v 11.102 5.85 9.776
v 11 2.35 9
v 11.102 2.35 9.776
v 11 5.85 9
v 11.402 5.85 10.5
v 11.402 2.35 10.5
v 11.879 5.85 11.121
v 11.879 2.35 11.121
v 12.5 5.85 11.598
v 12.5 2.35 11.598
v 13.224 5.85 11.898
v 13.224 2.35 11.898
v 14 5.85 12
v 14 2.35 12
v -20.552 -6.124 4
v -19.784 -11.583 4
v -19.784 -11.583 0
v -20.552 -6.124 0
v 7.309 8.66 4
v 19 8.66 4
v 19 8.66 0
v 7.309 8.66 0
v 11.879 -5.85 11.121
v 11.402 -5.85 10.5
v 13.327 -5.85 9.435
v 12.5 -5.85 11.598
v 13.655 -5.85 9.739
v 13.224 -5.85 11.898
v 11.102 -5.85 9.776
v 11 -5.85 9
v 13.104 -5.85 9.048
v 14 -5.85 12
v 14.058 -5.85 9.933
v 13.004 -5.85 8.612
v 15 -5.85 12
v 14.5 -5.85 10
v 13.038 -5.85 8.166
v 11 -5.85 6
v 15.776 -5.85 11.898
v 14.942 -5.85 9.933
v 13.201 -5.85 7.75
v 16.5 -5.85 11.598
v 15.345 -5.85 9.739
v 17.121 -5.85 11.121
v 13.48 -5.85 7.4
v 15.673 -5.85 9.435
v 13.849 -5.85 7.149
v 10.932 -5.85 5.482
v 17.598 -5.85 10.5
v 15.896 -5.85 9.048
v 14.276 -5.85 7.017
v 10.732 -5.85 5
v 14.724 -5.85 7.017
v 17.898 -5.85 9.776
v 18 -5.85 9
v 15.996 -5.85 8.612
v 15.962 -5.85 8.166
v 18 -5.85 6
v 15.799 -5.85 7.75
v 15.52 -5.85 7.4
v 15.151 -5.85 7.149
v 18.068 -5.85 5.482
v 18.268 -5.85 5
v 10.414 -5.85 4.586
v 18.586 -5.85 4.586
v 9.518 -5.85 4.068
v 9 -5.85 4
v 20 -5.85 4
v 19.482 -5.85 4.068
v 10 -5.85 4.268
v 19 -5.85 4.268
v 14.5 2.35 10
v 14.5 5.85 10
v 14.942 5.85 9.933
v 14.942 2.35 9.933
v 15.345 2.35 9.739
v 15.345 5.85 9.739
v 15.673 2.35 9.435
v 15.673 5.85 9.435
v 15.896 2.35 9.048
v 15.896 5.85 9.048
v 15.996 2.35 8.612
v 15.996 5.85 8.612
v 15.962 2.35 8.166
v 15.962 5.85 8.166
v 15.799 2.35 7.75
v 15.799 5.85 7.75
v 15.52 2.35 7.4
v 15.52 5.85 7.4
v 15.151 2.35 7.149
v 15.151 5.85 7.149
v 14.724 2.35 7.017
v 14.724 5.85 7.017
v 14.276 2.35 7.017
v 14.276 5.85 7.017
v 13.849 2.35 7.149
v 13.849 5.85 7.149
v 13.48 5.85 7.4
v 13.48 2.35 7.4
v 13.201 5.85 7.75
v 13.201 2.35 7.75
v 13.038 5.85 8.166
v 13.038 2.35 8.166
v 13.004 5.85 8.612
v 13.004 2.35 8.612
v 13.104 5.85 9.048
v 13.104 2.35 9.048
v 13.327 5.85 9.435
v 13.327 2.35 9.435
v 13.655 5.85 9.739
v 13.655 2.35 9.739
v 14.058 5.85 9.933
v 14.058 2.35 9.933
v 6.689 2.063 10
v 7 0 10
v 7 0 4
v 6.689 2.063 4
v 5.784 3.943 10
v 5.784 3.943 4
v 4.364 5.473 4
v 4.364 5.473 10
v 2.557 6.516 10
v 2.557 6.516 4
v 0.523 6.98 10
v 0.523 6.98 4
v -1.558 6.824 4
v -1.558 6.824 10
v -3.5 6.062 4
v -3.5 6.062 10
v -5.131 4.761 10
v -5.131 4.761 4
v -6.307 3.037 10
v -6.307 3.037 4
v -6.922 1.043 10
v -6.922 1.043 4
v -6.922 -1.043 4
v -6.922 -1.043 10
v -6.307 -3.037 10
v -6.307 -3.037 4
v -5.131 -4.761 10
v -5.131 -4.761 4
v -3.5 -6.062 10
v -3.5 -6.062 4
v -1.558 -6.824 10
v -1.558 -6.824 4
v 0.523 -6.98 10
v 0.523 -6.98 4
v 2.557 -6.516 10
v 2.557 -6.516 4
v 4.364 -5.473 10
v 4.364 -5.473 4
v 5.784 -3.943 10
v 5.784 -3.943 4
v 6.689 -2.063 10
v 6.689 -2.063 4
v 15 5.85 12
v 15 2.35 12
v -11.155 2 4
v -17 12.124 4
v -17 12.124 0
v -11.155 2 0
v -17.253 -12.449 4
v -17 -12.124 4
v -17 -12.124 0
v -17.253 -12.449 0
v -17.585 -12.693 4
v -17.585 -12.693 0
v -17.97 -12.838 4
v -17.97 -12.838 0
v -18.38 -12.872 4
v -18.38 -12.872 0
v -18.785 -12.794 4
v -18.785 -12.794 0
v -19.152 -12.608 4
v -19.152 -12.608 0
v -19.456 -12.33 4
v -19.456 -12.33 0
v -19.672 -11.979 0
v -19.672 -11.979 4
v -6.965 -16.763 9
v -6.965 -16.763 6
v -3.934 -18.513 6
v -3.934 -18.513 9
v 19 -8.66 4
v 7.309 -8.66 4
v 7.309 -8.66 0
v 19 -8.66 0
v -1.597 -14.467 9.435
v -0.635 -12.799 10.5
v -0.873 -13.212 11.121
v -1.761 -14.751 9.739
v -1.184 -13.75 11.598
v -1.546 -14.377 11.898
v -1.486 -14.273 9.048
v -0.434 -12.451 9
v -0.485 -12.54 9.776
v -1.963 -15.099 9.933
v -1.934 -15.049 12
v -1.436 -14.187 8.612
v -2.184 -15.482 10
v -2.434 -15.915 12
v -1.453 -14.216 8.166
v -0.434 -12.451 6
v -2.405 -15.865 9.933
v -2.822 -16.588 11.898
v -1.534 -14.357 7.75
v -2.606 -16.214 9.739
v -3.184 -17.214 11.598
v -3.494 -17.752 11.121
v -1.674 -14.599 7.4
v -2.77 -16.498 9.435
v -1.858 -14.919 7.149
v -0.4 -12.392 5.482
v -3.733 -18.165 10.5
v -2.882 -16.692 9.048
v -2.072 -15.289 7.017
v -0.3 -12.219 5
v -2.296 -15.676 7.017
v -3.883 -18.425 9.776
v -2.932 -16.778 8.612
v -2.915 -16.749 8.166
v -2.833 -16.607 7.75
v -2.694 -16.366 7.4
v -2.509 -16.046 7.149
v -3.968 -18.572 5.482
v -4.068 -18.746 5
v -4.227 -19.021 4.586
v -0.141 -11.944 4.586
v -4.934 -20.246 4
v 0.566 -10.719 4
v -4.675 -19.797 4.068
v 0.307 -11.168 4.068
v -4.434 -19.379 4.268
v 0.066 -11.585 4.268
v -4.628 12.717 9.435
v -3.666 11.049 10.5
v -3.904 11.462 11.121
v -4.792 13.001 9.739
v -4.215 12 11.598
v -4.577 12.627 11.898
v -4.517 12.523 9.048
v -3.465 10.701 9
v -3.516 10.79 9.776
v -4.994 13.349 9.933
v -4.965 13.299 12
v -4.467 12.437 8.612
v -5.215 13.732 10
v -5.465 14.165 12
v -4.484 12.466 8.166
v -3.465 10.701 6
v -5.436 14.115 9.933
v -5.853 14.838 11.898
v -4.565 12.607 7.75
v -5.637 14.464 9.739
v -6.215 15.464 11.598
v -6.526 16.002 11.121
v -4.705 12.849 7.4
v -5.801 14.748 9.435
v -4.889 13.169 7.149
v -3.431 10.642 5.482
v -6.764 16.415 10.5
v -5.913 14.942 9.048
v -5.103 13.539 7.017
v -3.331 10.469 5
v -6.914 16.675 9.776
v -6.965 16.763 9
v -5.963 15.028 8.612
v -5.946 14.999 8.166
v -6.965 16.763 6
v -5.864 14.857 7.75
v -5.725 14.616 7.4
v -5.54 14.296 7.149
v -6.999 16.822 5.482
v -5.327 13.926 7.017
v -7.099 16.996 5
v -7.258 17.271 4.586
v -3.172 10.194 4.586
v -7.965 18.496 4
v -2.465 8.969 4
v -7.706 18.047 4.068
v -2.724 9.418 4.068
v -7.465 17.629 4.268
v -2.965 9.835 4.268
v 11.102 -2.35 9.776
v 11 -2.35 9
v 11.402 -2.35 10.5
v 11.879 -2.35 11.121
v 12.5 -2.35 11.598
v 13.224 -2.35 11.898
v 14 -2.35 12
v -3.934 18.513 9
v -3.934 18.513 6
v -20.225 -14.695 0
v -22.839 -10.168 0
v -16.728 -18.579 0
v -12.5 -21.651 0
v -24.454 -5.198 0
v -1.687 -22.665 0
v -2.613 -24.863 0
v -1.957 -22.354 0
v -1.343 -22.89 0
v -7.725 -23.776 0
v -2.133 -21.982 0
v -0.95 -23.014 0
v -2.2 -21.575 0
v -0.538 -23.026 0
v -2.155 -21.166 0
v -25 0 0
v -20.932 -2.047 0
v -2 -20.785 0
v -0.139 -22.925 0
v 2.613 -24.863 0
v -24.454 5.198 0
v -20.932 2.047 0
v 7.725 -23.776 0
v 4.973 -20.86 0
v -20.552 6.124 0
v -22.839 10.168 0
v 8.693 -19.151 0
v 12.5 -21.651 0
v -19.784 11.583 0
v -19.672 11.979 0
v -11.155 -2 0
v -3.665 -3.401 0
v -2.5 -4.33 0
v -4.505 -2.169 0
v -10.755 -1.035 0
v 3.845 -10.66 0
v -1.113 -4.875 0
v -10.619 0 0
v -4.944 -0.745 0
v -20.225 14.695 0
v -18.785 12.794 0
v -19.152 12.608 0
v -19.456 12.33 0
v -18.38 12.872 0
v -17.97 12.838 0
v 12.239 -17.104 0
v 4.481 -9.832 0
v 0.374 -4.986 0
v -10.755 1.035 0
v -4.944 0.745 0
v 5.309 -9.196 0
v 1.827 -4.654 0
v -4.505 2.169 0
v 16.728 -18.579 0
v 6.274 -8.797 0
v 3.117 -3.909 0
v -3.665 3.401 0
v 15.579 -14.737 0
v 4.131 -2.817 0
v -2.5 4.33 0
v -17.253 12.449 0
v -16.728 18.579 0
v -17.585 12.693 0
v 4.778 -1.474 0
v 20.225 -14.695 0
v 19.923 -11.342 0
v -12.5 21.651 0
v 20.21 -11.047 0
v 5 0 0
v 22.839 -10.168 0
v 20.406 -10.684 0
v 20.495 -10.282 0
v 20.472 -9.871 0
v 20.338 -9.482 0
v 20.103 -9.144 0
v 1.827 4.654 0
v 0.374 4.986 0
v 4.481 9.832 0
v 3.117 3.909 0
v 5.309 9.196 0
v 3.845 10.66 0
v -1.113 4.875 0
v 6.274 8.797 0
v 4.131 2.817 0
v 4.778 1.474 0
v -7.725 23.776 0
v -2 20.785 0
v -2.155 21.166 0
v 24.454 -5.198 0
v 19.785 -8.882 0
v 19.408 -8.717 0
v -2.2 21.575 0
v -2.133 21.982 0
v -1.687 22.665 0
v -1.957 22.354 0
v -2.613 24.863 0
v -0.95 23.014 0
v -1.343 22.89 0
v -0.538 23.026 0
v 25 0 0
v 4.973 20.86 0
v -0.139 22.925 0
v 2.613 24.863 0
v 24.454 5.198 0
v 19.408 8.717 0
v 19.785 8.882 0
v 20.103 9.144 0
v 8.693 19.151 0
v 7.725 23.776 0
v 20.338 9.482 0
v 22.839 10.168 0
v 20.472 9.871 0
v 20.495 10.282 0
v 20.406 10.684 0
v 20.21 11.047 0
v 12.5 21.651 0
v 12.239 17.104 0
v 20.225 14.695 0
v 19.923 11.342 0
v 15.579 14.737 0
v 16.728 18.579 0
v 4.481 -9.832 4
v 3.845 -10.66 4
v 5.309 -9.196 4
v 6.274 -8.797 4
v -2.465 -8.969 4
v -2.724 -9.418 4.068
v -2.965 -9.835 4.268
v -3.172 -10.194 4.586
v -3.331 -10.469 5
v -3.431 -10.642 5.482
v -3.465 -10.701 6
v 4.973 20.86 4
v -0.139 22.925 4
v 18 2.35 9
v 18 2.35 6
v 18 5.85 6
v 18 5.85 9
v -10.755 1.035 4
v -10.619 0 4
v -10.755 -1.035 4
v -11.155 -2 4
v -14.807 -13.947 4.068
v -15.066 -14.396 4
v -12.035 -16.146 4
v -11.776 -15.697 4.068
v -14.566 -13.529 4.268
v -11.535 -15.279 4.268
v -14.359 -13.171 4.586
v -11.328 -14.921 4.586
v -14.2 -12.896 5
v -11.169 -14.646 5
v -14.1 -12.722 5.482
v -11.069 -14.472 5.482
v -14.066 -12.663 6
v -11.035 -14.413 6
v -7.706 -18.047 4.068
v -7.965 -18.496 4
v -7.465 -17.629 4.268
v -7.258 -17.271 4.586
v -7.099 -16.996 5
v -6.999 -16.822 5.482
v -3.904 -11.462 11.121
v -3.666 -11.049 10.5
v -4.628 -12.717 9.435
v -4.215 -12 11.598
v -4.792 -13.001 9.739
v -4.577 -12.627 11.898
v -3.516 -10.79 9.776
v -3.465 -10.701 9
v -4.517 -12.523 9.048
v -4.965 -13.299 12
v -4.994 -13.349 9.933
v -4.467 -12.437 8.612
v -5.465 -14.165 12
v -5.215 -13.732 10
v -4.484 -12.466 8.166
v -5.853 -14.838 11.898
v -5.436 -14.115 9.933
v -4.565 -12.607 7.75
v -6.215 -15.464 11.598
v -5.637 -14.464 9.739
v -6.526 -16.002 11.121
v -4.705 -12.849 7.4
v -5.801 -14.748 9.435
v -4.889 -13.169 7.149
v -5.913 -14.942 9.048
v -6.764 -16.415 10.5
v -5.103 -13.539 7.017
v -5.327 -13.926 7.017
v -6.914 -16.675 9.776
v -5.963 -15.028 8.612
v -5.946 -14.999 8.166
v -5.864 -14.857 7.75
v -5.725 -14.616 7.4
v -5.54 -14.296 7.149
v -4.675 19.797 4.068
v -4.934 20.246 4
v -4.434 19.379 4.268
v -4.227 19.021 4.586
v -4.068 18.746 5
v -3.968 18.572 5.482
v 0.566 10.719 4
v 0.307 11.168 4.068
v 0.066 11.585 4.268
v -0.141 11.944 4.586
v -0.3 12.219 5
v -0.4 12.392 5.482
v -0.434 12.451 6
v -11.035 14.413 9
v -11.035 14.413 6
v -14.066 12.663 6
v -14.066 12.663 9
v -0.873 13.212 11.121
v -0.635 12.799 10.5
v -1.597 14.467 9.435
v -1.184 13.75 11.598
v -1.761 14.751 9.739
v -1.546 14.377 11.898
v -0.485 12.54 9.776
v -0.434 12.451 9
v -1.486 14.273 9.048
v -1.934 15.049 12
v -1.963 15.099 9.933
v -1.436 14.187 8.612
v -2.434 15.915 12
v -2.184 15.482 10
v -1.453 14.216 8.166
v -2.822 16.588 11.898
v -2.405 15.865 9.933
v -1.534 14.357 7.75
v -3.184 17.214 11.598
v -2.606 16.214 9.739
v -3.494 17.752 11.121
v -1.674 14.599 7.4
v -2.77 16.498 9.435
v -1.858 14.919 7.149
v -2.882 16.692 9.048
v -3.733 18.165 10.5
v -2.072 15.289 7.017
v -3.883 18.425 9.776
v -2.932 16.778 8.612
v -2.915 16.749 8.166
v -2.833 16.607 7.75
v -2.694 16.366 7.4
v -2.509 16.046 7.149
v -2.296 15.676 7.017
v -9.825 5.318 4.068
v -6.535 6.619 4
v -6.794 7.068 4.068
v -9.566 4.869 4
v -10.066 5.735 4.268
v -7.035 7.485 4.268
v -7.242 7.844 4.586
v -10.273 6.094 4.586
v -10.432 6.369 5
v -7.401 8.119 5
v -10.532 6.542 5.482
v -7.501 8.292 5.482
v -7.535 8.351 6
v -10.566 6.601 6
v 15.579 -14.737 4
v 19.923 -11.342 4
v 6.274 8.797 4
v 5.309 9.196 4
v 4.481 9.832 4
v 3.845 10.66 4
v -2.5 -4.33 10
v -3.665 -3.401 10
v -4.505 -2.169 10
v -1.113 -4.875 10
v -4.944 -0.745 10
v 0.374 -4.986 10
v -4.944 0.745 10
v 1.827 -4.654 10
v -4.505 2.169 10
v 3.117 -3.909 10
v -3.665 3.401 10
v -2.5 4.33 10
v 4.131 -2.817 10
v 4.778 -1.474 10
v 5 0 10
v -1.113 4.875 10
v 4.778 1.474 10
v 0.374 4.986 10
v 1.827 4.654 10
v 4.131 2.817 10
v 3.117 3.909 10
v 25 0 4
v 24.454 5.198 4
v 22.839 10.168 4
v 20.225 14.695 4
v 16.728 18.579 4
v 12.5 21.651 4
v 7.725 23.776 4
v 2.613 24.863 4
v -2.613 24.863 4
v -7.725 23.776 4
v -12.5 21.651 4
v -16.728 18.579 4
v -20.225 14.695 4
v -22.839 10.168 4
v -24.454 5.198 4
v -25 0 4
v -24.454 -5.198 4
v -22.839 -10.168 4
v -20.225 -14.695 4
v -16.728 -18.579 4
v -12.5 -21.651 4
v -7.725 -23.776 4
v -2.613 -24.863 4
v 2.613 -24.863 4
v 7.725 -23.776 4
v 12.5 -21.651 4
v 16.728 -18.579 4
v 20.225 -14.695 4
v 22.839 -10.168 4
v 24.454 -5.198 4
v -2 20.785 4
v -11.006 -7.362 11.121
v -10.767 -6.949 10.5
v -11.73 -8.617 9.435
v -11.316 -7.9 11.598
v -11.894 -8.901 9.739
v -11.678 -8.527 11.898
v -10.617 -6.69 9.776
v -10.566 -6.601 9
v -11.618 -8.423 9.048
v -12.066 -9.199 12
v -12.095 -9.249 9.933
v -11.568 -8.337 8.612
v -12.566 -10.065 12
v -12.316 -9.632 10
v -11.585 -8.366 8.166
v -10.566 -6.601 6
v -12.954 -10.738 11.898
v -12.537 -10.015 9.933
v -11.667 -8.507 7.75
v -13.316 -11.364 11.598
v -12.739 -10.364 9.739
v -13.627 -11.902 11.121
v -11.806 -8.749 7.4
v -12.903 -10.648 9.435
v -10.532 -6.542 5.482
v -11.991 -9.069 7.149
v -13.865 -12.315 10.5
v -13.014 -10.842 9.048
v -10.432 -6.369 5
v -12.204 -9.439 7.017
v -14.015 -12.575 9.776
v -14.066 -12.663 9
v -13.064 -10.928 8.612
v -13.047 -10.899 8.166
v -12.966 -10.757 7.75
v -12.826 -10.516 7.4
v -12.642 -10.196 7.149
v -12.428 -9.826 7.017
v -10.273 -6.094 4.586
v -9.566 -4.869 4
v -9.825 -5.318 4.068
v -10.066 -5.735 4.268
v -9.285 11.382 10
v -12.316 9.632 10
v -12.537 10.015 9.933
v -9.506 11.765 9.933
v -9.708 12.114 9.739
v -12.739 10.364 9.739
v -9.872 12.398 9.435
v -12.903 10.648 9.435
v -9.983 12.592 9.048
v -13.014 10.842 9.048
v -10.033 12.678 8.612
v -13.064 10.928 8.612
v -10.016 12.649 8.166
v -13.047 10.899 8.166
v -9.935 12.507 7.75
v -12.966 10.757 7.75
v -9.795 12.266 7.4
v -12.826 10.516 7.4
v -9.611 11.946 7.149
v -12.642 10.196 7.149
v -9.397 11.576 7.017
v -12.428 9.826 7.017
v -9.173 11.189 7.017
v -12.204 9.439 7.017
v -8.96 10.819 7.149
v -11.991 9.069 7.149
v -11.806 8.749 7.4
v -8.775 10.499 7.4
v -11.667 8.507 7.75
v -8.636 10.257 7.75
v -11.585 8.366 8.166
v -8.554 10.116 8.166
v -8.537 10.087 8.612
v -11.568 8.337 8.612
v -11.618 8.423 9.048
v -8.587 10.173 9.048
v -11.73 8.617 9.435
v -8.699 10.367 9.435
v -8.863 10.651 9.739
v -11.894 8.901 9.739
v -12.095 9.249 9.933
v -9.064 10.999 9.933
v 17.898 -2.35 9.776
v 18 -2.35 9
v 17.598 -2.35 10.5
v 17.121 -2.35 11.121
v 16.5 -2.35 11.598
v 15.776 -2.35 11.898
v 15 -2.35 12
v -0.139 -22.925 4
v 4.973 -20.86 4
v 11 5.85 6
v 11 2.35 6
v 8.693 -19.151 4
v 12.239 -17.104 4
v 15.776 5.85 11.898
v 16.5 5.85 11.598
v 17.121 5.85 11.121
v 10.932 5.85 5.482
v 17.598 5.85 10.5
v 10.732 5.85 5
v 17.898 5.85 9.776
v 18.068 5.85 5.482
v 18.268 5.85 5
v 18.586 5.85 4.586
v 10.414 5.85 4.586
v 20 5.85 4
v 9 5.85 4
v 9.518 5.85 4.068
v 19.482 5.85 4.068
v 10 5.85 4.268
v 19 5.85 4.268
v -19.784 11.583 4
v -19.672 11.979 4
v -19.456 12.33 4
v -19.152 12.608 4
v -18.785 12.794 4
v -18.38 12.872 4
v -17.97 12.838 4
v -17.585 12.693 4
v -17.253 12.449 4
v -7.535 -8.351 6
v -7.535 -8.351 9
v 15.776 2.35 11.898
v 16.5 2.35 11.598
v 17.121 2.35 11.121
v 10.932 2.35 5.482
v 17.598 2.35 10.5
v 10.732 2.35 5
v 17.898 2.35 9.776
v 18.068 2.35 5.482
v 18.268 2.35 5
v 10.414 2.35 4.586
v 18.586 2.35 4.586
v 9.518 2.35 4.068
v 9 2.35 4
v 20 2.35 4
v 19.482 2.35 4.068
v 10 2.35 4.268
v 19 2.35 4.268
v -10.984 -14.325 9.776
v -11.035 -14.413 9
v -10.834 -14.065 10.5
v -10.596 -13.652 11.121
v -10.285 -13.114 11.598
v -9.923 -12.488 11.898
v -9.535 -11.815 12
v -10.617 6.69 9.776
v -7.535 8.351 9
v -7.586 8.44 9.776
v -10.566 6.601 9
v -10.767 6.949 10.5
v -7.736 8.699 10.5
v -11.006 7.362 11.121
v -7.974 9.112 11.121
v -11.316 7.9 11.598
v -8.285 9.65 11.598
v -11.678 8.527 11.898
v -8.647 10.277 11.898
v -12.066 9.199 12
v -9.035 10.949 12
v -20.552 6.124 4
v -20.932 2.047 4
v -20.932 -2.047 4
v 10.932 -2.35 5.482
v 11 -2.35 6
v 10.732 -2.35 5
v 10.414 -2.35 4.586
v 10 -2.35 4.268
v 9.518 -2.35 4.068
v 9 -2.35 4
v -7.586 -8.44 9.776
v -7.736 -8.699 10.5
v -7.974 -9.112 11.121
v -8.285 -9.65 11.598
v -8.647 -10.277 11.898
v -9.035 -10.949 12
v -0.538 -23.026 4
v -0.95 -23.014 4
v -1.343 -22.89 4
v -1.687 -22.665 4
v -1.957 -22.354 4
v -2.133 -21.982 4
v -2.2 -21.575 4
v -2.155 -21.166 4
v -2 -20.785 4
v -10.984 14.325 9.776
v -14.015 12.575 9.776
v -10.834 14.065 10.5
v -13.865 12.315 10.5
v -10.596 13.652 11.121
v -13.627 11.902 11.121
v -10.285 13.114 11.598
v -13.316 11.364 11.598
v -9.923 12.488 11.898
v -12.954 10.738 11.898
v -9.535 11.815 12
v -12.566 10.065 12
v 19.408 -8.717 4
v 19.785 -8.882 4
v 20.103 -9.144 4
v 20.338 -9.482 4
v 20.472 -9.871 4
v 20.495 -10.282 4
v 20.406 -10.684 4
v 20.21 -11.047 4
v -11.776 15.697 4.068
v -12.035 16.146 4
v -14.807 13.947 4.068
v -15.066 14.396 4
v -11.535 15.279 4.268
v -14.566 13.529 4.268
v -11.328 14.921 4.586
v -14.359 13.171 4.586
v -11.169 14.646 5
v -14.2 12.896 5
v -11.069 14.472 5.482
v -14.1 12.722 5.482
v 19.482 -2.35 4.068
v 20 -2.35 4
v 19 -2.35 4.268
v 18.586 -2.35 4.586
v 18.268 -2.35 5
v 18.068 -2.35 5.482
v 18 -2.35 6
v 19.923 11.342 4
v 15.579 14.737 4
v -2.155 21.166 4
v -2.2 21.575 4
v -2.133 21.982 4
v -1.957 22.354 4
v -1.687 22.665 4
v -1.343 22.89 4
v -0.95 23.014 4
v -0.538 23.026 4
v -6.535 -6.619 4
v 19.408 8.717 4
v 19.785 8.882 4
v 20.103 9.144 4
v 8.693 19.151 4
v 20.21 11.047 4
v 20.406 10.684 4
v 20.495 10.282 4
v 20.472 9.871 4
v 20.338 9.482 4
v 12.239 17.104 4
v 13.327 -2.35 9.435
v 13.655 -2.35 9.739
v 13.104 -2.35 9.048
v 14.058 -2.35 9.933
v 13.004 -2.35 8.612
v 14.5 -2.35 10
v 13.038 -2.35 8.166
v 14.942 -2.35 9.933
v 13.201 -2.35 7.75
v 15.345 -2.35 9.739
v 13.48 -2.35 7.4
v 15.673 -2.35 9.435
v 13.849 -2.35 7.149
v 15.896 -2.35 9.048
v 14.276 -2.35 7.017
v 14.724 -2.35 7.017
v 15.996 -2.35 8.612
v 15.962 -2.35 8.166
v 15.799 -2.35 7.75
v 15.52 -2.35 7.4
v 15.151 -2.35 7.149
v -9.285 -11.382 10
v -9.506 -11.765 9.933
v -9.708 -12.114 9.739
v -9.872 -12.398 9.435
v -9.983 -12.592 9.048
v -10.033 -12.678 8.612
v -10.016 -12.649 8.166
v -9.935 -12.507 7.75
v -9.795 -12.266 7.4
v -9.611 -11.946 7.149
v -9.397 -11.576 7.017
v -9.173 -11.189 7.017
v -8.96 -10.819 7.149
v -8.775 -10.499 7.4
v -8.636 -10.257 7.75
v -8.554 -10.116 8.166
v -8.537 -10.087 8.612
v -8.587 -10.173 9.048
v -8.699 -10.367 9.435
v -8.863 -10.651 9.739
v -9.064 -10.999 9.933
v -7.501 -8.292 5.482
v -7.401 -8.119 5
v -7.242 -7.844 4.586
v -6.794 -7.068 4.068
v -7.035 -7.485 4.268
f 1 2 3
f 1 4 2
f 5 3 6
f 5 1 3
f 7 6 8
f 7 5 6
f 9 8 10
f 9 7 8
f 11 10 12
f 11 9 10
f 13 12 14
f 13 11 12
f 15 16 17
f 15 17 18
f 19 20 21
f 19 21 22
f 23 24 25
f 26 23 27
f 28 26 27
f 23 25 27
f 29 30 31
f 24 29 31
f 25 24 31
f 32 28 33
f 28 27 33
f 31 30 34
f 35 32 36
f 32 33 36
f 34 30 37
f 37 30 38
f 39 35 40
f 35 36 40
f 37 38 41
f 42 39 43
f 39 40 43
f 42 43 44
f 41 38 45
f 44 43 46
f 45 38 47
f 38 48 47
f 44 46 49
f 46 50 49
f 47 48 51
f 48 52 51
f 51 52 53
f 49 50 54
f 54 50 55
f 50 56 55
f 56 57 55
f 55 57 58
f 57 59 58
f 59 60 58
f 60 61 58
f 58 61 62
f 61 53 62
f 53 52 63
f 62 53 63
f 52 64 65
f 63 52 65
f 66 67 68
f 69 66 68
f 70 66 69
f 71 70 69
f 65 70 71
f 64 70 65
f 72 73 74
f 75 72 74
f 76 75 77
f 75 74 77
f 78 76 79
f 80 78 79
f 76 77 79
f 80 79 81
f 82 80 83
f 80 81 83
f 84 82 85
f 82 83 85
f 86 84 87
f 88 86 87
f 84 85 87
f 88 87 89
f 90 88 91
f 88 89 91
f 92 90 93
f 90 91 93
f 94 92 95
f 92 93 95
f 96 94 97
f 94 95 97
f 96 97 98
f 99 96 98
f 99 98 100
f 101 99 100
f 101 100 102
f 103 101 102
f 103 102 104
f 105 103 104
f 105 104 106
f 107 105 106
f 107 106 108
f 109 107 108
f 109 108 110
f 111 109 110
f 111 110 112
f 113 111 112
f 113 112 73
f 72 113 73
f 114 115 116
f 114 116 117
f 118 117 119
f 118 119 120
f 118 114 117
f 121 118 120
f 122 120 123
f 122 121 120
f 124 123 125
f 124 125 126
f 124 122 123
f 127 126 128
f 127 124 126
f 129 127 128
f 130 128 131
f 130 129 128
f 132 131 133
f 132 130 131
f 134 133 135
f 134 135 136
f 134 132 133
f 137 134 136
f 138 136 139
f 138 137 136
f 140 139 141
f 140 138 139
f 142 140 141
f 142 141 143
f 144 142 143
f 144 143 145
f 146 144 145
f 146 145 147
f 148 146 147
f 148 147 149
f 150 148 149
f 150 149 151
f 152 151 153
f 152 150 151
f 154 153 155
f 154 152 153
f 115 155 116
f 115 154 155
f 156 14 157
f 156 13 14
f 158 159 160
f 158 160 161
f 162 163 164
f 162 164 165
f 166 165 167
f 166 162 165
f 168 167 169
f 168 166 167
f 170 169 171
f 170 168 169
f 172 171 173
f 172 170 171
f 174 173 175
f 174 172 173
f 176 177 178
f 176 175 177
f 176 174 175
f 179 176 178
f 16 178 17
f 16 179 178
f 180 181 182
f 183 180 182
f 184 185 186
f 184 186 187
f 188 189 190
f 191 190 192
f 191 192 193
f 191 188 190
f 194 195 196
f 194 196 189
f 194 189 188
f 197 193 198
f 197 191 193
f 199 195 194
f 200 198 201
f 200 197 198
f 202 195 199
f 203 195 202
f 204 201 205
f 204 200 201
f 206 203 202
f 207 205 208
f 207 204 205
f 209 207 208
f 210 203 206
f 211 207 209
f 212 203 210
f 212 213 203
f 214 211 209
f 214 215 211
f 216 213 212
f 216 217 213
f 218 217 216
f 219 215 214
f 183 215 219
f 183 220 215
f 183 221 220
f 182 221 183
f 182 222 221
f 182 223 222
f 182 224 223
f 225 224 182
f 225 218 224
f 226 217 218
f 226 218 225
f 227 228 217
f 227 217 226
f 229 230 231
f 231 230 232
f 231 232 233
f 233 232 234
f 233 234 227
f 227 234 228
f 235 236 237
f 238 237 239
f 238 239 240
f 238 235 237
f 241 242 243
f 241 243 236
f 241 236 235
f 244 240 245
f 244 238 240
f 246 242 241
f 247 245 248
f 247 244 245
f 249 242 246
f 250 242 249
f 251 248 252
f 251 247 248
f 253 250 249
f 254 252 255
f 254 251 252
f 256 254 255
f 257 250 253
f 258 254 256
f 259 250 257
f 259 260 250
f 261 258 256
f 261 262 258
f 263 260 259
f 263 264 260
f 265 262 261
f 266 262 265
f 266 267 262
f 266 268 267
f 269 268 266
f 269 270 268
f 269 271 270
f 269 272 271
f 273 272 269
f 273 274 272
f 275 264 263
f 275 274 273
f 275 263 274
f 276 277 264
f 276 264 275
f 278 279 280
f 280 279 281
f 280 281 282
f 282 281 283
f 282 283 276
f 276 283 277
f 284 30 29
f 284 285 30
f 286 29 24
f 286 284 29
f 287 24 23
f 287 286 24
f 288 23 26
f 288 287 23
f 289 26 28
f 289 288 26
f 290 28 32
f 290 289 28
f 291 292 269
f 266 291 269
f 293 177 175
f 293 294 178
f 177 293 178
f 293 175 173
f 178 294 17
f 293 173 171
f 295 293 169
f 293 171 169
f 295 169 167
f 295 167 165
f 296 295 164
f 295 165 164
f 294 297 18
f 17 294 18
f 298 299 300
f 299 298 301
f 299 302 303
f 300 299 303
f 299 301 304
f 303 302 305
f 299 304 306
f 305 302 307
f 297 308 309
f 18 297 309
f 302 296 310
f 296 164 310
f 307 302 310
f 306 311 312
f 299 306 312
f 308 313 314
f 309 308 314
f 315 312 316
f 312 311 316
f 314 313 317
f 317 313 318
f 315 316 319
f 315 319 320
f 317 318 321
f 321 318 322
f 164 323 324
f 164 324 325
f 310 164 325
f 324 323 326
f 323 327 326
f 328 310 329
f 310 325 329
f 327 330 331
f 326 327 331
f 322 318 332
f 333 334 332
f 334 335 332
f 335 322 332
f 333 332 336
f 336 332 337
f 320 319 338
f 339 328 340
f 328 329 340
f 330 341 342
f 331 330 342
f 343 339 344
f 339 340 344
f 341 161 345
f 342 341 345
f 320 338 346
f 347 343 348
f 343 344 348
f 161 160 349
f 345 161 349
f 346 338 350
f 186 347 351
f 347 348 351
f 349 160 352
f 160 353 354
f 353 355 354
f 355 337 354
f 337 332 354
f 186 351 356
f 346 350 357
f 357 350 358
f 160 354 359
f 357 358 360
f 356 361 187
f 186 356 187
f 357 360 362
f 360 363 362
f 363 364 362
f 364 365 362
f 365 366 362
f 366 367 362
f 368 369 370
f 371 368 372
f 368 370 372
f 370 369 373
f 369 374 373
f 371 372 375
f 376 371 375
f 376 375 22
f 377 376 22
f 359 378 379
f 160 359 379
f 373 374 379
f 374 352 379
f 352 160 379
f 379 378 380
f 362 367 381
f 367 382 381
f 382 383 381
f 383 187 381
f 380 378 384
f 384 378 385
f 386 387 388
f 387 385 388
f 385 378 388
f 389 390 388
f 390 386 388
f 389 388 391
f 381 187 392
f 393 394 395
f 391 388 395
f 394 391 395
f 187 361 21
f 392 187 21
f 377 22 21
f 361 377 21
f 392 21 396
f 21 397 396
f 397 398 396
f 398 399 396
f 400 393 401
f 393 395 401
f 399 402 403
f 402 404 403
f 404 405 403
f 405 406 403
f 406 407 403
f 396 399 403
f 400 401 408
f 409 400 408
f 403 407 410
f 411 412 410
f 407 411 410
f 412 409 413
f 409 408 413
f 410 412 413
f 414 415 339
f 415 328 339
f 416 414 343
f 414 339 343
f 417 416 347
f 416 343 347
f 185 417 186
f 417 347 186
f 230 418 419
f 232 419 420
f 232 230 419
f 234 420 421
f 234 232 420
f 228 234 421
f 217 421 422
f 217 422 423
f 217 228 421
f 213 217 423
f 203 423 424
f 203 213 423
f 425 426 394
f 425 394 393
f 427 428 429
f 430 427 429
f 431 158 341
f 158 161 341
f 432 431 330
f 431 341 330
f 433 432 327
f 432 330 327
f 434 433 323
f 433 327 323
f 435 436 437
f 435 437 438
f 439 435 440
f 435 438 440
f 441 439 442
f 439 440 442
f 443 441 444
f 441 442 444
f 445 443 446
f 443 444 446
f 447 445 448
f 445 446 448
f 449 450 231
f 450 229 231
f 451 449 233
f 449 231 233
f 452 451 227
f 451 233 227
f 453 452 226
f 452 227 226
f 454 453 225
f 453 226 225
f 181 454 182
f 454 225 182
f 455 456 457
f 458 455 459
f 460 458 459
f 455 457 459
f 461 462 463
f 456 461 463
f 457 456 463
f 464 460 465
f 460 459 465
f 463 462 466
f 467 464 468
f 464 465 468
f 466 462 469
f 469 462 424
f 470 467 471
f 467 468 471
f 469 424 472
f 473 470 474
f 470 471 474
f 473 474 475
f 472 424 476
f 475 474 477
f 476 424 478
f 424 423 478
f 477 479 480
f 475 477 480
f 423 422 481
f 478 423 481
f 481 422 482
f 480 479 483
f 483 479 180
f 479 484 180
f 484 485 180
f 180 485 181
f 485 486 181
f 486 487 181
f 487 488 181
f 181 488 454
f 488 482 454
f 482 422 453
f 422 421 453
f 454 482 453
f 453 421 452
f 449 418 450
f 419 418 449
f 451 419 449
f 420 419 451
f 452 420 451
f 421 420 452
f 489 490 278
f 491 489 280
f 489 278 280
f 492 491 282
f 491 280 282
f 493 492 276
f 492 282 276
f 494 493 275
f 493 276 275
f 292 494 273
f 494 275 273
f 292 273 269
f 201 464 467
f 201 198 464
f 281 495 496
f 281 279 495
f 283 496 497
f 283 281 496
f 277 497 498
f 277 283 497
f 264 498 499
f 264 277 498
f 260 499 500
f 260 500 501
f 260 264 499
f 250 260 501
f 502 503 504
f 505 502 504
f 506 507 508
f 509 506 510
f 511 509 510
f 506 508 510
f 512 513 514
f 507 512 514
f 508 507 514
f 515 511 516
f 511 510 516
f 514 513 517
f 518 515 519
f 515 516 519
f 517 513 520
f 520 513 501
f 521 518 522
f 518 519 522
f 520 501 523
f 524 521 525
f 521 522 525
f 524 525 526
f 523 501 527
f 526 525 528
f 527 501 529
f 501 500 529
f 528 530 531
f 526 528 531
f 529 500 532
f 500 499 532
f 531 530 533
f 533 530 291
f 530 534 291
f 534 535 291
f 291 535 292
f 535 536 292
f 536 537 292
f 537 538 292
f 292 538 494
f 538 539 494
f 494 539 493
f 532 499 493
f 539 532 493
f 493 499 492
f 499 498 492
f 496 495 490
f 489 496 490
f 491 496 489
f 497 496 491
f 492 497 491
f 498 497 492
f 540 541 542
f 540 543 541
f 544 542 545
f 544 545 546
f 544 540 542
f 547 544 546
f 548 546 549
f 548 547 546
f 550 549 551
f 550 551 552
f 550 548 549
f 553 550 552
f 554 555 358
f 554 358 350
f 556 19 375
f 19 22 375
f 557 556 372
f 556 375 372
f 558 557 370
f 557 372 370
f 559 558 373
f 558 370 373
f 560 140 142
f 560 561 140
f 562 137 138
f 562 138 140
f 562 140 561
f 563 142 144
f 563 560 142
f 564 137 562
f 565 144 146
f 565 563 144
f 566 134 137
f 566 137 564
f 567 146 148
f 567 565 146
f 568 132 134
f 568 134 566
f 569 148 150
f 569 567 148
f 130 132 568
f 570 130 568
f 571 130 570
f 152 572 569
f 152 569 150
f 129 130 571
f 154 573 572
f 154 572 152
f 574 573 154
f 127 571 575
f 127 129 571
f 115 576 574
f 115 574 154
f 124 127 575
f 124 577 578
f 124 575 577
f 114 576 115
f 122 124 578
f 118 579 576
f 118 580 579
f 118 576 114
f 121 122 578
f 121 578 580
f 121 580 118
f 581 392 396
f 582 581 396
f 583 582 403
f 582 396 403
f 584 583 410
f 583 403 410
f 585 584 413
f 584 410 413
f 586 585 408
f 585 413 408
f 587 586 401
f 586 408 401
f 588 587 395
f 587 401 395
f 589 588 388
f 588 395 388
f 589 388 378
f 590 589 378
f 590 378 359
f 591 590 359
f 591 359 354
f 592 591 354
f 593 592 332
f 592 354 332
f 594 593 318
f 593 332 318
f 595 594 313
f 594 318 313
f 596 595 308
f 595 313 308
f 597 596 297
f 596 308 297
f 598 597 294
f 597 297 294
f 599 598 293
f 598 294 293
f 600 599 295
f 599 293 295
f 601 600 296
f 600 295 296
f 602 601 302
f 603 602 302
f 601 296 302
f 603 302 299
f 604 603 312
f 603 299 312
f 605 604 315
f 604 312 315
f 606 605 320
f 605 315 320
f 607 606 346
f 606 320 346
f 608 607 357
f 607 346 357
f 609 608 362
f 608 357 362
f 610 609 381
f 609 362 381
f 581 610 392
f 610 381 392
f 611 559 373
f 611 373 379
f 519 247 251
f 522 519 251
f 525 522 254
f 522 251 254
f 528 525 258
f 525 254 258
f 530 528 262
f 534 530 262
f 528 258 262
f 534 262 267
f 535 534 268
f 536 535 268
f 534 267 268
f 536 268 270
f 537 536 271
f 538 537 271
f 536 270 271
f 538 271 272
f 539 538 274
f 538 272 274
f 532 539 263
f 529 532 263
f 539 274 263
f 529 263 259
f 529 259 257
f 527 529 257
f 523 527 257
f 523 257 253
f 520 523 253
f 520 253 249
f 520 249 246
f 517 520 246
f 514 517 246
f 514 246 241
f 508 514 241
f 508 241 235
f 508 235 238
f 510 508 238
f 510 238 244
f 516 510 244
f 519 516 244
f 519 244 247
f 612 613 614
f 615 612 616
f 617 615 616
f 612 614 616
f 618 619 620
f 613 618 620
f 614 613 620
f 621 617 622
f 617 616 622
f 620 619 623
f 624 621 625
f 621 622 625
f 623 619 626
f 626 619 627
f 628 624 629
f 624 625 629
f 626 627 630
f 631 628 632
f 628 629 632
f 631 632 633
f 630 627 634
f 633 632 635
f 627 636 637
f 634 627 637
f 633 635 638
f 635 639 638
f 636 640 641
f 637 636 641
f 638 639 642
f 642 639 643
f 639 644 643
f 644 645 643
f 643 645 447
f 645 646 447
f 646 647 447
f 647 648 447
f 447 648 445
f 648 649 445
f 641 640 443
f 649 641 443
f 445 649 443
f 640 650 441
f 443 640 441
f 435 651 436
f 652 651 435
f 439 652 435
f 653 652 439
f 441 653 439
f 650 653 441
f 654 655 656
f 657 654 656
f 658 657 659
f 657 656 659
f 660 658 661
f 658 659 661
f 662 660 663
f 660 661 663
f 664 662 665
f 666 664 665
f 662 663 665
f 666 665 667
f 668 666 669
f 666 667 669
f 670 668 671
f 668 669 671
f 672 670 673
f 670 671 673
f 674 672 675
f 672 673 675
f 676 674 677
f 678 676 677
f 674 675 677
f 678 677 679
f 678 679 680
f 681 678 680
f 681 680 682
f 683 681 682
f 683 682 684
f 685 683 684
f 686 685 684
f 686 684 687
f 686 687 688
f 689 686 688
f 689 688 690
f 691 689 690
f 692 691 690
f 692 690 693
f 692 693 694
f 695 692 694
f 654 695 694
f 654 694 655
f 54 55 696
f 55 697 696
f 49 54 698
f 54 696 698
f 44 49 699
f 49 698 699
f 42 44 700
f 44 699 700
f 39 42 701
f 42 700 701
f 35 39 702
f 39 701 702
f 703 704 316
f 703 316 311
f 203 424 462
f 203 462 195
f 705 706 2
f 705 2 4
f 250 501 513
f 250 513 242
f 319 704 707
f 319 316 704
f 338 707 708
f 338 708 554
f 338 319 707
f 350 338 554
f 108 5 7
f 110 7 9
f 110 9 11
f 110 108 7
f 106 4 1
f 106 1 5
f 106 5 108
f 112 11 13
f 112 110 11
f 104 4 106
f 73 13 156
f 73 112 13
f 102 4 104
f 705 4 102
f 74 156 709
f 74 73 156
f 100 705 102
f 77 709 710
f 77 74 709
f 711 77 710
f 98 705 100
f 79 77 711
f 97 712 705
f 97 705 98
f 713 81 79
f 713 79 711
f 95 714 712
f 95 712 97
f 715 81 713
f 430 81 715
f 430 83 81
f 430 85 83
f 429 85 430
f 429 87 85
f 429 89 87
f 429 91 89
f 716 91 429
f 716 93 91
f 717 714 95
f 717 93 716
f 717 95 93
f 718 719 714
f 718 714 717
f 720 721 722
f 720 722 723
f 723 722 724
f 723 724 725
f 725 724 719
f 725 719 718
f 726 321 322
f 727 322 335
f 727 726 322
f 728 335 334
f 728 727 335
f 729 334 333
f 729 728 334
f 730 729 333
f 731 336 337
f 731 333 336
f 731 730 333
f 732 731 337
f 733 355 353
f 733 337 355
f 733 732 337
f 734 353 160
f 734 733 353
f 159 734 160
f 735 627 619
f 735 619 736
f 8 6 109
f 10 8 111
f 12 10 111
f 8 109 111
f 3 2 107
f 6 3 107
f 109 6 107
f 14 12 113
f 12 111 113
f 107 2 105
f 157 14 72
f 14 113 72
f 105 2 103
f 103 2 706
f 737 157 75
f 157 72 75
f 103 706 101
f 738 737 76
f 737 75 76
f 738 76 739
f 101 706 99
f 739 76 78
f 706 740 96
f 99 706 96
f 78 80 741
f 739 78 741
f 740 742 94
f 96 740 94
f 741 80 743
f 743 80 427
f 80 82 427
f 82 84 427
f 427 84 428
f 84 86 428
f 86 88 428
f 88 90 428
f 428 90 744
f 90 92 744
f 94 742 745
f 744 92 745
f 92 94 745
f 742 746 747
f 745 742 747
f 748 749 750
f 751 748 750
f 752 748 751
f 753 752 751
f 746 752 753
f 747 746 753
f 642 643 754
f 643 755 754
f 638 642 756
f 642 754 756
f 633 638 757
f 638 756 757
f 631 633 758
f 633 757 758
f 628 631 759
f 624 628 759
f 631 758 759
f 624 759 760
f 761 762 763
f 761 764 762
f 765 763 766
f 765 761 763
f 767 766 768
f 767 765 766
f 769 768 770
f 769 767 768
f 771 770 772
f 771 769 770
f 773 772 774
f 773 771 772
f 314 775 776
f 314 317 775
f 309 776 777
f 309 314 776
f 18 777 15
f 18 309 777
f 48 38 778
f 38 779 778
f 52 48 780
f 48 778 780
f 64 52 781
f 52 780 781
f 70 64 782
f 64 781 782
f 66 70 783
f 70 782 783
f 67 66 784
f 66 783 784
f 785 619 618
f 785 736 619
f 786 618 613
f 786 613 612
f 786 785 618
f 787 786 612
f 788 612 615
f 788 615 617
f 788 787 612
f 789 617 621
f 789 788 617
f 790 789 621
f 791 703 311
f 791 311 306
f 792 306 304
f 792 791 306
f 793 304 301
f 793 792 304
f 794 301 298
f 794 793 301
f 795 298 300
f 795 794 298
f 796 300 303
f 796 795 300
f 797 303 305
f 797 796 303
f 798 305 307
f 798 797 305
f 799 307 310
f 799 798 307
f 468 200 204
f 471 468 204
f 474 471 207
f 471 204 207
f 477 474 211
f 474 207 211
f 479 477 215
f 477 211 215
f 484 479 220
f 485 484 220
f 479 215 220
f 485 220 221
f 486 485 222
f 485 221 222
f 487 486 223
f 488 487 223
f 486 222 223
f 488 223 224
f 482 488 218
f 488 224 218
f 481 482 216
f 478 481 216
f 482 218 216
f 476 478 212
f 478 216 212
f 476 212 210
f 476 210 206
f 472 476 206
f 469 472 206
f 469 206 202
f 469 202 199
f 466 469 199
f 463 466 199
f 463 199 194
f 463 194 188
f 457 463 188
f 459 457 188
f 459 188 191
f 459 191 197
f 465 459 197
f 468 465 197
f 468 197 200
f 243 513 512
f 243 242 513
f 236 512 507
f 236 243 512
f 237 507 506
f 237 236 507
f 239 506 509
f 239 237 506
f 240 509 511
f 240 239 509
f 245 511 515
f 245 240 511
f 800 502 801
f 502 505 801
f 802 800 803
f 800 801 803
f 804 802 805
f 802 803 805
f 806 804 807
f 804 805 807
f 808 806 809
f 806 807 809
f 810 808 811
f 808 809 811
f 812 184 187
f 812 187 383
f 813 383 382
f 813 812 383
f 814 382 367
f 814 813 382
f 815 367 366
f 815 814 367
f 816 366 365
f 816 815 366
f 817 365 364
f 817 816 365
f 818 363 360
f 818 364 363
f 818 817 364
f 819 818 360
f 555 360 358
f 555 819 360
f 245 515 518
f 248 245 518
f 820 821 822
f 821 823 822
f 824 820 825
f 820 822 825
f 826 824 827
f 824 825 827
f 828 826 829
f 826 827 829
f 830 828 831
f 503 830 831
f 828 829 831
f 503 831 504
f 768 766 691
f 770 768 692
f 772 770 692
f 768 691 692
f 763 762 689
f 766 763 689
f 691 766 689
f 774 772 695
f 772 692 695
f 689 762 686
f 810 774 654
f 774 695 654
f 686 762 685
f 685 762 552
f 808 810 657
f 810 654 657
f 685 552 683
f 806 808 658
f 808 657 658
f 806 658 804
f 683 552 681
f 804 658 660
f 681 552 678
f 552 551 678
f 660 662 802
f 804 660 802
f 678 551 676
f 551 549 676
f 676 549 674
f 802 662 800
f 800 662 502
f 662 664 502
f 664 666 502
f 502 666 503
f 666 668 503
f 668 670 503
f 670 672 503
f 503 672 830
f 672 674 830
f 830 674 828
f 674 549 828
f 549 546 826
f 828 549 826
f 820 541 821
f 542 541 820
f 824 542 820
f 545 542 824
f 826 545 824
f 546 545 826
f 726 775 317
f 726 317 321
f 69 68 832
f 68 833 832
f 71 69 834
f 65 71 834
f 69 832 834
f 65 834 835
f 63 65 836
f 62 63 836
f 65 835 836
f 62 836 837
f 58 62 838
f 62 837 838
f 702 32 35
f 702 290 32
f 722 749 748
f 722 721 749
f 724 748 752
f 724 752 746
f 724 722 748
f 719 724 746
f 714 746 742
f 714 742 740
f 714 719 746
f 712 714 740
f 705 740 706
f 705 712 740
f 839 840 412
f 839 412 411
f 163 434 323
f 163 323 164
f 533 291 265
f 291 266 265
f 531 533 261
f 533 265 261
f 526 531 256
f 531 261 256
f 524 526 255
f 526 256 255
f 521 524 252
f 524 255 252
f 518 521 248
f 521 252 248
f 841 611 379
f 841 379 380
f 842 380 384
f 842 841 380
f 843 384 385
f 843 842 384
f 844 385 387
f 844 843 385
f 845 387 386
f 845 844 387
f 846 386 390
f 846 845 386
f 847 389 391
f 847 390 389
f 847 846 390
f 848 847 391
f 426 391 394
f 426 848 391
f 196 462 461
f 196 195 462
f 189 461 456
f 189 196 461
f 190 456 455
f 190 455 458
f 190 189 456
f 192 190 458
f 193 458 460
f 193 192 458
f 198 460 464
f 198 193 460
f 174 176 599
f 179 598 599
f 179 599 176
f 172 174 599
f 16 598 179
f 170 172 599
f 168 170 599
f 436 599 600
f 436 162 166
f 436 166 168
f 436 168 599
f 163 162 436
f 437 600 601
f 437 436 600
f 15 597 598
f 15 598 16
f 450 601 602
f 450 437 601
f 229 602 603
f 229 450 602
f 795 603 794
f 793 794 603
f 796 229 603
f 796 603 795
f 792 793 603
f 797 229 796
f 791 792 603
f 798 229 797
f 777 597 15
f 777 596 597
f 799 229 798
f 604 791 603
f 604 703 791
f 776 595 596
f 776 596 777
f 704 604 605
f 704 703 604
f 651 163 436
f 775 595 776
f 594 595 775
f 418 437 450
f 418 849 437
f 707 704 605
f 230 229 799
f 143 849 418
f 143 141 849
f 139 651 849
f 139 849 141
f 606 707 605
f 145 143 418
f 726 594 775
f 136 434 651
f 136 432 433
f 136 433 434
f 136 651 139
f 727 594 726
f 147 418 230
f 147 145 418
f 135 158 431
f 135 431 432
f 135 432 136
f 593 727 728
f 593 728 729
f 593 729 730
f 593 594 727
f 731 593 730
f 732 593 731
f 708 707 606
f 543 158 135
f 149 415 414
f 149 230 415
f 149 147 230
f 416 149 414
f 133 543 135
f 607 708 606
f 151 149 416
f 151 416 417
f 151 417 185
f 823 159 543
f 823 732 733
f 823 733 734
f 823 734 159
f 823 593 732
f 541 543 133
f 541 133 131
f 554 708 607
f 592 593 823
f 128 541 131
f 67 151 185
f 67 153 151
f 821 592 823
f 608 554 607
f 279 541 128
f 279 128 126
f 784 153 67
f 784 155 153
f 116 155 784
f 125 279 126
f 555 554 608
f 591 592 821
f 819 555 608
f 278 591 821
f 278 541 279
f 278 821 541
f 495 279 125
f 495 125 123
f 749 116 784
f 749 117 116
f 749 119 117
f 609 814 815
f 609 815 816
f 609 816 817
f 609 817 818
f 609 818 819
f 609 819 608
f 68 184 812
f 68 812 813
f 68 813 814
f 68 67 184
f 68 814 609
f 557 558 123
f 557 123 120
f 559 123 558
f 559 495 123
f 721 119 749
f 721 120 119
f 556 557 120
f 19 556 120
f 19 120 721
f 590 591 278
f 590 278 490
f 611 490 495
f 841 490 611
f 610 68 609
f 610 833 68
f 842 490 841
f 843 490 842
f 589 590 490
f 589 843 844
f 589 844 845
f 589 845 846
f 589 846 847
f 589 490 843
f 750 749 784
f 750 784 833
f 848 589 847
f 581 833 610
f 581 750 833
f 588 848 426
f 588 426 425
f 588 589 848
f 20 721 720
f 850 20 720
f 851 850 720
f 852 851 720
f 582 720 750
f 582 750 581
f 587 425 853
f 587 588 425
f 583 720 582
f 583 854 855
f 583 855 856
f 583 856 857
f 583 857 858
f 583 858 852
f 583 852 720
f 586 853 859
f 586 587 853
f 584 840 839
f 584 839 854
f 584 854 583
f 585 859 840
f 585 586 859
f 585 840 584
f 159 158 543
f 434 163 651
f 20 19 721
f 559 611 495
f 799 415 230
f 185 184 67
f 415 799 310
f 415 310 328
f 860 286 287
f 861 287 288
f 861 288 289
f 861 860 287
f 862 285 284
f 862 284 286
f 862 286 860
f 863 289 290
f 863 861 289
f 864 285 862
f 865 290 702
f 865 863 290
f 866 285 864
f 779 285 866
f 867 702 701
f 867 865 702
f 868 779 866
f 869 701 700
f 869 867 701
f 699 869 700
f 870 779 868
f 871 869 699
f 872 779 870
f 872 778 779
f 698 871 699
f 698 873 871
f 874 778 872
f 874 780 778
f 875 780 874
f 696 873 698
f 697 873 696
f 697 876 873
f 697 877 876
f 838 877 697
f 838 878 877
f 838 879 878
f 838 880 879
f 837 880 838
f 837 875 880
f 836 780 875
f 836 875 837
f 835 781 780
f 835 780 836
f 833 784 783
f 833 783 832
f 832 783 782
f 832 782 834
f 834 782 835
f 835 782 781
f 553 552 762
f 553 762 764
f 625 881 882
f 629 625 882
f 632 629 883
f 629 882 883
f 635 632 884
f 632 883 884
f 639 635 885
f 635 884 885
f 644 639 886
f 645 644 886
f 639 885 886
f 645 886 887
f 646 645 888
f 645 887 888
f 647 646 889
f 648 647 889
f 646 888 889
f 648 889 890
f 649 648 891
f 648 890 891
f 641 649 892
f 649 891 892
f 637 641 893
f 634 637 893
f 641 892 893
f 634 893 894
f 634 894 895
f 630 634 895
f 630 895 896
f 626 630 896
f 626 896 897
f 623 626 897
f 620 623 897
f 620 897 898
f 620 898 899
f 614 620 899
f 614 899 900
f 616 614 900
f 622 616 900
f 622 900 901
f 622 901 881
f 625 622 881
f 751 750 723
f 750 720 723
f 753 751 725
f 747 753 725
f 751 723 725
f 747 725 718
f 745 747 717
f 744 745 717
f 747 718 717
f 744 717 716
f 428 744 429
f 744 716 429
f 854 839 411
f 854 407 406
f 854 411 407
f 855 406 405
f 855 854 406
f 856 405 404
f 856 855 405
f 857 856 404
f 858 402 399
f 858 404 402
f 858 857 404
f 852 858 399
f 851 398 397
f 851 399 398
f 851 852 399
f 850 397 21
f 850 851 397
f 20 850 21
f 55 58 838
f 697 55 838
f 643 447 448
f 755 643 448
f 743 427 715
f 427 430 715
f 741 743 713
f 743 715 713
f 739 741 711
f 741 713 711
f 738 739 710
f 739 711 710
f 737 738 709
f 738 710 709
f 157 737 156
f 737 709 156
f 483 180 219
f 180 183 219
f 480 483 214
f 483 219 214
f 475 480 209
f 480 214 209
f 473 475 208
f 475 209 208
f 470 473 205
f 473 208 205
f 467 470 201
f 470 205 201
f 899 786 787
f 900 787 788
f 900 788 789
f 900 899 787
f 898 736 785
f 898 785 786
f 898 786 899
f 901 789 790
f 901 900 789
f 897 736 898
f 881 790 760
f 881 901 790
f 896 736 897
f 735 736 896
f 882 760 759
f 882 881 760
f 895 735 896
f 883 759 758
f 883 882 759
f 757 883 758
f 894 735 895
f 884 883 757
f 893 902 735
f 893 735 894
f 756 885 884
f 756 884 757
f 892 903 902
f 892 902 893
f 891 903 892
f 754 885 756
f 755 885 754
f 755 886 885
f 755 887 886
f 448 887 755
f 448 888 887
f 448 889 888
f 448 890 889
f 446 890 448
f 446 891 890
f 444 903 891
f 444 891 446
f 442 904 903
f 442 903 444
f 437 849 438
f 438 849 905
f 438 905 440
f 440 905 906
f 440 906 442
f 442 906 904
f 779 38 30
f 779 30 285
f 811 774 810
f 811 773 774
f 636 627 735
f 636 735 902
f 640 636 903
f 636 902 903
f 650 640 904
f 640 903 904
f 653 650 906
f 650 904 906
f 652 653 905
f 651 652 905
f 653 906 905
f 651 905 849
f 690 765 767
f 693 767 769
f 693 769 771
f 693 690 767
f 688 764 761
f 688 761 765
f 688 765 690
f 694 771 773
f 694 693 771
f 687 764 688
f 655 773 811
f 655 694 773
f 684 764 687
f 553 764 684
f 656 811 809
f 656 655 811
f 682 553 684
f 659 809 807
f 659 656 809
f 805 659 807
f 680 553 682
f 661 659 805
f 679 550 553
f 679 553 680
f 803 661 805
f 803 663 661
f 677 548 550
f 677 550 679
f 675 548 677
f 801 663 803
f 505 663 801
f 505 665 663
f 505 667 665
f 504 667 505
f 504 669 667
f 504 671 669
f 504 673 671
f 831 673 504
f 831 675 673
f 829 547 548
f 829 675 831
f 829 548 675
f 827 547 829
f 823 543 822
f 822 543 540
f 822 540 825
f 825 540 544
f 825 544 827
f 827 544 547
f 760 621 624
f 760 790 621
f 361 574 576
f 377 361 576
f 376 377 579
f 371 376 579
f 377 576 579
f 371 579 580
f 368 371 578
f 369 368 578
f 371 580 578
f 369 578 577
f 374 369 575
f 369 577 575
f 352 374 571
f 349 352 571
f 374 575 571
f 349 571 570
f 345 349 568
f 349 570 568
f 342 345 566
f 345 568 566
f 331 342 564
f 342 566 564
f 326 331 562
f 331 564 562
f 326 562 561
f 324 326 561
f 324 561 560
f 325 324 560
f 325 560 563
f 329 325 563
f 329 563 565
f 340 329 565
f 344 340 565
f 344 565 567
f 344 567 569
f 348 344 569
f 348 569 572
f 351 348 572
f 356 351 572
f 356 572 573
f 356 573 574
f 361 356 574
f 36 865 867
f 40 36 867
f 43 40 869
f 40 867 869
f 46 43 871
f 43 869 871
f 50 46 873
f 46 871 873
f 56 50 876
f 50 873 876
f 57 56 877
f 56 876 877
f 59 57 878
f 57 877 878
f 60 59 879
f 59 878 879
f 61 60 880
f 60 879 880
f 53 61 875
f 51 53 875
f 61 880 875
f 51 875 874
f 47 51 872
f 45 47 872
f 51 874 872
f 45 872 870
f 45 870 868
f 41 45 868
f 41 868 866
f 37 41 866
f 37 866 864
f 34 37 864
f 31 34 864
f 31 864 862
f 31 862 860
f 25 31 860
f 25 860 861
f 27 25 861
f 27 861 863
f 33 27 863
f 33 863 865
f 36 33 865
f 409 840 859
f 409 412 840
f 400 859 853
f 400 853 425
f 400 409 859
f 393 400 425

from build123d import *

# Parameters (mm, degrees)
SKETCH1_R                = 25
BOSS_EXTRUDE1_DEPTH      = 4
SKETCH2_R                = 5
CUT_EXTRUDE1_DEPTH       = 36.580893749
SKETCH3_W                = 7
SKETCH3_H                = 3.5
BOSS_EXTRUDE2_DEPTH      = 8
FILLET1_R                = 3
SKETCH4_R                = 1.5
CUT_EXTRUDE2_DEPTH       = 42.481592303
FILLET2_R                = 2
CIRPATTERN1_COUNT        = 3
FILLET1_OF_CIRPATTERN1_R = 3
FILLET2_OF_CIRPATTERN1_R = 2
BOSS_EXTRUDE3_START      = 6
SKETCH5_R                = 7
SKETCH5_R_2              = 5
BOSS_EXTRUDE3_DEPTH      = 6
CUT_EXTRUDE3_DEPTH       = 37.249137921
FILLET3_R                = 4
FILLET4_R                = 44
CIRPATTERN2_COUNT        = 3
FILLET3_OF_CIRPATTERN2_R = 4
FILLET4_OF_CIRPATTERN2_R = 44


with BuildPart() as part:
    # Sketch1 → Boss-Extrude1 (new body)
    with BuildSketch(Plane.XY):
        Circle(SKETCH1_R)
    extrude(amount=BOSS_EXTRUDE1_DEPTH)

    # Sketch2 → Cut-Extrude1 (cut, through all)
    with BuildSketch(Plane.XY.offset(4)):
        Circle(SKETCH2_R)
    extrude(amount=-CUT_EXTRUDE1_DEPTH, mode=Mode.SUBTRACT)

    # Sketch3 → Boss-Extrude2 (add)
    with BuildSketch(Plane.XY.offset(4)):
        with Locations((14.5, -4.1)):
            Rectangle(SKETCH3_W, SKETCH3_H)
        with Locations((14.5, 4.1)):
            Rectangle(SKETCH3_W, SKETCH3_H)
    boss_extrude2 = extrude(amount=BOSS_EXTRUDE2_DEPTH)

    # Fillet1
    fillet1_edges = [part.edges().sort_by_distance(p)[0] for p in [
        (11, 4.1, 12),
        (18, 4.1, 12),
        (11, -4.1, 12),
        (18, -4.1, 12),
    ]]
    fillet(fillet1_edges, radius=FILLET1_R)

    # Sketch4 → Cut-Extrude2 (cut, through all)
    with BuildSketch(Plane(origin=(0, 5.85, 0), x_dir=(1, 0, 0), z_dir=(0, 1, 0))):
        with Locations(Location((14.5, -8.5, 0), (0, 0, 270))):
            Circle(SKETCH4_R)
    cut_extrude2 = extrude(amount=-CUT_EXTRUDE2_DEPTH, mode=Mode.SUBTRACT)

    # Fillet2
    fillet2_edges = [part.edges().sort_by_distance(p)[0] for p in [
        (11, 4.1, 4),
        (18, 4.1, 4),
        (11, -4.1, 4),
        (18, -4.1, 4),
    ]]
    fillet(fillet2_edges, radius=FILLET2_R)

    # CirPattern1: Boss-Extrude2, Cut-Extrude2 ×3 about axis
    cirpattern1_axis = Axis((0, 0, 0), (0, 0, 1))
    add([boss_extrude2.rotate(cirpattern1_axis, i * 360 / CIRPATTERN1_COUNT) for i in range(1, CIRPATTERN1_COUNT)])
    add([cut_extrude2.rotate(cirpattern1_axis, i * 360 / CIRPATTERN1_COUNT) for i in range(1, CIRPATTERN1_COUNT)], mode=Mode.SUBTRACT)

    # Fillet1 of CirPattern1
    fillet1_of_cirpattern1_edges = [part.edges().sort_by_distance(p)[0] for p in [
        (-9.050704156, 7.476279442, 12),
        (-12.550704156, 13.538457268, 12),
        (-1.949295844, 11.576279442, 12),
        (-5.449295844, 17.638457268, 12),
        (-1.949295844, -11.576279442, 12),
        (-5.449295844, -17.638457268, 12),
        (-9.050704156, -7.476279442, 12),
        (-12.550704156, -13.538457268, 12),
    ]]
    fillet(fillet1_of_cirpattern1_edges, radius=FILLET1_OF_CIRPATTERN1_R)

    # Fillet2 of CirPattern1
    fillet2_of_cirpattern1_edges = [part.edges().sort_by_distance(p)[0] for p in [
        (-9.050704156, 7.476279442, 4),
        (-12.550704156, 13.538457268, 4),
        (-1.949295844, 11.576279442, 4),
        (-5.449295844, 17.638457268, 4),
        (-1.949295844, -11.576279442, 4),
        (-5.449295844, -17.638457268, 4),
        (-9.050704156, -7.476279442, 4),
        (-12.550704156, -13.538457268, 4),
    ]]
    fillet(fillet2_of_cirpattern1_edges, radius=FILLET2_OF_CIRPATTERN1_R)

    # Sketch5 → Boss-Extrude3 (add)
    with BuildSketch(Plane.XY.offset(4).offset(BOSS_EXTRUDE3_START)):
        Circle(SKETCH5_R)
        Circle(SKETCH5_R_2, mode=Mode.SUBTRACT)
    extrude(amount=-BOSS_EXTRUDE3_DEPTH)

    # Sketch6 → Cut-Extrude3 (cut, through all)
    with BuildSketch(Plane.XY.offset(4)):
        with BuildLine():
            Line((5, 8.660254038), (-2, 20.784609691))
            ThreePointArc((-2, 20.784609691), (-1.833026265, 22.518698234), (-0.139052004, 22.925385473))
            Line((-0.139052004, 22.925385473), (10.706170451, 18.543631176))
            Line((10.706170451, 18.543631176), (19.923492213, 11.342270168))
            ThreePointArc((19.923492213, 11.342270168), (20.418277863, 9.671901806), (19, 8.660254038))
            Line((19, 8.660254038), (5, 8.660254038))
        make_face()
    cut_extrude3 = extrude(amount=-CUT_EXTRUDE3_DEPTH, mode=Mode.SUBTRACT)

    # Fillet3
    fillet3_edges = [part.edges().sort_by_distance(p)[0] for p in [
        (5, 8.660254038, 2),
    ]]
    fillet(fillet3_edges, radius=FILLET3_R)

    # Fillet4
    fillet4_edges = [part.edges().sort_by_distance(p)[0] for p in [
        (10.706170451, 18.543631176, 2),
    ]]
    fillet(fillet4_edges, radius=FILLET4_R)

    # CirPattern2: Cut-Extrude3 ×3 about axis
    cirpattern2_axis = Axis((0, 0, 0), (0, 0, 1))
    for i in range(1, CIRPATTERN2_COUNT):
        add(cut_extrude3.rotate(cirpattern2_axis, i * 360 / CIRPATTERN2_COUNT), mode=Mode.SUBTRACT)

    # Fillet3 of CirPattern2
    fillet3_of_cirpattern2_edges = [part.edges().sort_by_distance(p)[0] for p in [
        (-10, 0, 2),
        (5, -8.660254038, 2),
    ]]
    fillet(fillet3_of_cirpattern2_edges, radius=FILLET3_OF_CIRPATTERN2_R)

    # Fillet4 of CirPattern2
    fillet4_of_cirpattern2_edges = [part.edges().sort_by_distance(p)[0] for p in [
        (-21.412340902, 0, 2),
        (10.706170451, -18.543631176, 2),
    ]]
    fillet(fillet4_of_cirpattern2_edges, radius=FILLET4_OF_CIRPATTERN2_R)


solid = part.part
